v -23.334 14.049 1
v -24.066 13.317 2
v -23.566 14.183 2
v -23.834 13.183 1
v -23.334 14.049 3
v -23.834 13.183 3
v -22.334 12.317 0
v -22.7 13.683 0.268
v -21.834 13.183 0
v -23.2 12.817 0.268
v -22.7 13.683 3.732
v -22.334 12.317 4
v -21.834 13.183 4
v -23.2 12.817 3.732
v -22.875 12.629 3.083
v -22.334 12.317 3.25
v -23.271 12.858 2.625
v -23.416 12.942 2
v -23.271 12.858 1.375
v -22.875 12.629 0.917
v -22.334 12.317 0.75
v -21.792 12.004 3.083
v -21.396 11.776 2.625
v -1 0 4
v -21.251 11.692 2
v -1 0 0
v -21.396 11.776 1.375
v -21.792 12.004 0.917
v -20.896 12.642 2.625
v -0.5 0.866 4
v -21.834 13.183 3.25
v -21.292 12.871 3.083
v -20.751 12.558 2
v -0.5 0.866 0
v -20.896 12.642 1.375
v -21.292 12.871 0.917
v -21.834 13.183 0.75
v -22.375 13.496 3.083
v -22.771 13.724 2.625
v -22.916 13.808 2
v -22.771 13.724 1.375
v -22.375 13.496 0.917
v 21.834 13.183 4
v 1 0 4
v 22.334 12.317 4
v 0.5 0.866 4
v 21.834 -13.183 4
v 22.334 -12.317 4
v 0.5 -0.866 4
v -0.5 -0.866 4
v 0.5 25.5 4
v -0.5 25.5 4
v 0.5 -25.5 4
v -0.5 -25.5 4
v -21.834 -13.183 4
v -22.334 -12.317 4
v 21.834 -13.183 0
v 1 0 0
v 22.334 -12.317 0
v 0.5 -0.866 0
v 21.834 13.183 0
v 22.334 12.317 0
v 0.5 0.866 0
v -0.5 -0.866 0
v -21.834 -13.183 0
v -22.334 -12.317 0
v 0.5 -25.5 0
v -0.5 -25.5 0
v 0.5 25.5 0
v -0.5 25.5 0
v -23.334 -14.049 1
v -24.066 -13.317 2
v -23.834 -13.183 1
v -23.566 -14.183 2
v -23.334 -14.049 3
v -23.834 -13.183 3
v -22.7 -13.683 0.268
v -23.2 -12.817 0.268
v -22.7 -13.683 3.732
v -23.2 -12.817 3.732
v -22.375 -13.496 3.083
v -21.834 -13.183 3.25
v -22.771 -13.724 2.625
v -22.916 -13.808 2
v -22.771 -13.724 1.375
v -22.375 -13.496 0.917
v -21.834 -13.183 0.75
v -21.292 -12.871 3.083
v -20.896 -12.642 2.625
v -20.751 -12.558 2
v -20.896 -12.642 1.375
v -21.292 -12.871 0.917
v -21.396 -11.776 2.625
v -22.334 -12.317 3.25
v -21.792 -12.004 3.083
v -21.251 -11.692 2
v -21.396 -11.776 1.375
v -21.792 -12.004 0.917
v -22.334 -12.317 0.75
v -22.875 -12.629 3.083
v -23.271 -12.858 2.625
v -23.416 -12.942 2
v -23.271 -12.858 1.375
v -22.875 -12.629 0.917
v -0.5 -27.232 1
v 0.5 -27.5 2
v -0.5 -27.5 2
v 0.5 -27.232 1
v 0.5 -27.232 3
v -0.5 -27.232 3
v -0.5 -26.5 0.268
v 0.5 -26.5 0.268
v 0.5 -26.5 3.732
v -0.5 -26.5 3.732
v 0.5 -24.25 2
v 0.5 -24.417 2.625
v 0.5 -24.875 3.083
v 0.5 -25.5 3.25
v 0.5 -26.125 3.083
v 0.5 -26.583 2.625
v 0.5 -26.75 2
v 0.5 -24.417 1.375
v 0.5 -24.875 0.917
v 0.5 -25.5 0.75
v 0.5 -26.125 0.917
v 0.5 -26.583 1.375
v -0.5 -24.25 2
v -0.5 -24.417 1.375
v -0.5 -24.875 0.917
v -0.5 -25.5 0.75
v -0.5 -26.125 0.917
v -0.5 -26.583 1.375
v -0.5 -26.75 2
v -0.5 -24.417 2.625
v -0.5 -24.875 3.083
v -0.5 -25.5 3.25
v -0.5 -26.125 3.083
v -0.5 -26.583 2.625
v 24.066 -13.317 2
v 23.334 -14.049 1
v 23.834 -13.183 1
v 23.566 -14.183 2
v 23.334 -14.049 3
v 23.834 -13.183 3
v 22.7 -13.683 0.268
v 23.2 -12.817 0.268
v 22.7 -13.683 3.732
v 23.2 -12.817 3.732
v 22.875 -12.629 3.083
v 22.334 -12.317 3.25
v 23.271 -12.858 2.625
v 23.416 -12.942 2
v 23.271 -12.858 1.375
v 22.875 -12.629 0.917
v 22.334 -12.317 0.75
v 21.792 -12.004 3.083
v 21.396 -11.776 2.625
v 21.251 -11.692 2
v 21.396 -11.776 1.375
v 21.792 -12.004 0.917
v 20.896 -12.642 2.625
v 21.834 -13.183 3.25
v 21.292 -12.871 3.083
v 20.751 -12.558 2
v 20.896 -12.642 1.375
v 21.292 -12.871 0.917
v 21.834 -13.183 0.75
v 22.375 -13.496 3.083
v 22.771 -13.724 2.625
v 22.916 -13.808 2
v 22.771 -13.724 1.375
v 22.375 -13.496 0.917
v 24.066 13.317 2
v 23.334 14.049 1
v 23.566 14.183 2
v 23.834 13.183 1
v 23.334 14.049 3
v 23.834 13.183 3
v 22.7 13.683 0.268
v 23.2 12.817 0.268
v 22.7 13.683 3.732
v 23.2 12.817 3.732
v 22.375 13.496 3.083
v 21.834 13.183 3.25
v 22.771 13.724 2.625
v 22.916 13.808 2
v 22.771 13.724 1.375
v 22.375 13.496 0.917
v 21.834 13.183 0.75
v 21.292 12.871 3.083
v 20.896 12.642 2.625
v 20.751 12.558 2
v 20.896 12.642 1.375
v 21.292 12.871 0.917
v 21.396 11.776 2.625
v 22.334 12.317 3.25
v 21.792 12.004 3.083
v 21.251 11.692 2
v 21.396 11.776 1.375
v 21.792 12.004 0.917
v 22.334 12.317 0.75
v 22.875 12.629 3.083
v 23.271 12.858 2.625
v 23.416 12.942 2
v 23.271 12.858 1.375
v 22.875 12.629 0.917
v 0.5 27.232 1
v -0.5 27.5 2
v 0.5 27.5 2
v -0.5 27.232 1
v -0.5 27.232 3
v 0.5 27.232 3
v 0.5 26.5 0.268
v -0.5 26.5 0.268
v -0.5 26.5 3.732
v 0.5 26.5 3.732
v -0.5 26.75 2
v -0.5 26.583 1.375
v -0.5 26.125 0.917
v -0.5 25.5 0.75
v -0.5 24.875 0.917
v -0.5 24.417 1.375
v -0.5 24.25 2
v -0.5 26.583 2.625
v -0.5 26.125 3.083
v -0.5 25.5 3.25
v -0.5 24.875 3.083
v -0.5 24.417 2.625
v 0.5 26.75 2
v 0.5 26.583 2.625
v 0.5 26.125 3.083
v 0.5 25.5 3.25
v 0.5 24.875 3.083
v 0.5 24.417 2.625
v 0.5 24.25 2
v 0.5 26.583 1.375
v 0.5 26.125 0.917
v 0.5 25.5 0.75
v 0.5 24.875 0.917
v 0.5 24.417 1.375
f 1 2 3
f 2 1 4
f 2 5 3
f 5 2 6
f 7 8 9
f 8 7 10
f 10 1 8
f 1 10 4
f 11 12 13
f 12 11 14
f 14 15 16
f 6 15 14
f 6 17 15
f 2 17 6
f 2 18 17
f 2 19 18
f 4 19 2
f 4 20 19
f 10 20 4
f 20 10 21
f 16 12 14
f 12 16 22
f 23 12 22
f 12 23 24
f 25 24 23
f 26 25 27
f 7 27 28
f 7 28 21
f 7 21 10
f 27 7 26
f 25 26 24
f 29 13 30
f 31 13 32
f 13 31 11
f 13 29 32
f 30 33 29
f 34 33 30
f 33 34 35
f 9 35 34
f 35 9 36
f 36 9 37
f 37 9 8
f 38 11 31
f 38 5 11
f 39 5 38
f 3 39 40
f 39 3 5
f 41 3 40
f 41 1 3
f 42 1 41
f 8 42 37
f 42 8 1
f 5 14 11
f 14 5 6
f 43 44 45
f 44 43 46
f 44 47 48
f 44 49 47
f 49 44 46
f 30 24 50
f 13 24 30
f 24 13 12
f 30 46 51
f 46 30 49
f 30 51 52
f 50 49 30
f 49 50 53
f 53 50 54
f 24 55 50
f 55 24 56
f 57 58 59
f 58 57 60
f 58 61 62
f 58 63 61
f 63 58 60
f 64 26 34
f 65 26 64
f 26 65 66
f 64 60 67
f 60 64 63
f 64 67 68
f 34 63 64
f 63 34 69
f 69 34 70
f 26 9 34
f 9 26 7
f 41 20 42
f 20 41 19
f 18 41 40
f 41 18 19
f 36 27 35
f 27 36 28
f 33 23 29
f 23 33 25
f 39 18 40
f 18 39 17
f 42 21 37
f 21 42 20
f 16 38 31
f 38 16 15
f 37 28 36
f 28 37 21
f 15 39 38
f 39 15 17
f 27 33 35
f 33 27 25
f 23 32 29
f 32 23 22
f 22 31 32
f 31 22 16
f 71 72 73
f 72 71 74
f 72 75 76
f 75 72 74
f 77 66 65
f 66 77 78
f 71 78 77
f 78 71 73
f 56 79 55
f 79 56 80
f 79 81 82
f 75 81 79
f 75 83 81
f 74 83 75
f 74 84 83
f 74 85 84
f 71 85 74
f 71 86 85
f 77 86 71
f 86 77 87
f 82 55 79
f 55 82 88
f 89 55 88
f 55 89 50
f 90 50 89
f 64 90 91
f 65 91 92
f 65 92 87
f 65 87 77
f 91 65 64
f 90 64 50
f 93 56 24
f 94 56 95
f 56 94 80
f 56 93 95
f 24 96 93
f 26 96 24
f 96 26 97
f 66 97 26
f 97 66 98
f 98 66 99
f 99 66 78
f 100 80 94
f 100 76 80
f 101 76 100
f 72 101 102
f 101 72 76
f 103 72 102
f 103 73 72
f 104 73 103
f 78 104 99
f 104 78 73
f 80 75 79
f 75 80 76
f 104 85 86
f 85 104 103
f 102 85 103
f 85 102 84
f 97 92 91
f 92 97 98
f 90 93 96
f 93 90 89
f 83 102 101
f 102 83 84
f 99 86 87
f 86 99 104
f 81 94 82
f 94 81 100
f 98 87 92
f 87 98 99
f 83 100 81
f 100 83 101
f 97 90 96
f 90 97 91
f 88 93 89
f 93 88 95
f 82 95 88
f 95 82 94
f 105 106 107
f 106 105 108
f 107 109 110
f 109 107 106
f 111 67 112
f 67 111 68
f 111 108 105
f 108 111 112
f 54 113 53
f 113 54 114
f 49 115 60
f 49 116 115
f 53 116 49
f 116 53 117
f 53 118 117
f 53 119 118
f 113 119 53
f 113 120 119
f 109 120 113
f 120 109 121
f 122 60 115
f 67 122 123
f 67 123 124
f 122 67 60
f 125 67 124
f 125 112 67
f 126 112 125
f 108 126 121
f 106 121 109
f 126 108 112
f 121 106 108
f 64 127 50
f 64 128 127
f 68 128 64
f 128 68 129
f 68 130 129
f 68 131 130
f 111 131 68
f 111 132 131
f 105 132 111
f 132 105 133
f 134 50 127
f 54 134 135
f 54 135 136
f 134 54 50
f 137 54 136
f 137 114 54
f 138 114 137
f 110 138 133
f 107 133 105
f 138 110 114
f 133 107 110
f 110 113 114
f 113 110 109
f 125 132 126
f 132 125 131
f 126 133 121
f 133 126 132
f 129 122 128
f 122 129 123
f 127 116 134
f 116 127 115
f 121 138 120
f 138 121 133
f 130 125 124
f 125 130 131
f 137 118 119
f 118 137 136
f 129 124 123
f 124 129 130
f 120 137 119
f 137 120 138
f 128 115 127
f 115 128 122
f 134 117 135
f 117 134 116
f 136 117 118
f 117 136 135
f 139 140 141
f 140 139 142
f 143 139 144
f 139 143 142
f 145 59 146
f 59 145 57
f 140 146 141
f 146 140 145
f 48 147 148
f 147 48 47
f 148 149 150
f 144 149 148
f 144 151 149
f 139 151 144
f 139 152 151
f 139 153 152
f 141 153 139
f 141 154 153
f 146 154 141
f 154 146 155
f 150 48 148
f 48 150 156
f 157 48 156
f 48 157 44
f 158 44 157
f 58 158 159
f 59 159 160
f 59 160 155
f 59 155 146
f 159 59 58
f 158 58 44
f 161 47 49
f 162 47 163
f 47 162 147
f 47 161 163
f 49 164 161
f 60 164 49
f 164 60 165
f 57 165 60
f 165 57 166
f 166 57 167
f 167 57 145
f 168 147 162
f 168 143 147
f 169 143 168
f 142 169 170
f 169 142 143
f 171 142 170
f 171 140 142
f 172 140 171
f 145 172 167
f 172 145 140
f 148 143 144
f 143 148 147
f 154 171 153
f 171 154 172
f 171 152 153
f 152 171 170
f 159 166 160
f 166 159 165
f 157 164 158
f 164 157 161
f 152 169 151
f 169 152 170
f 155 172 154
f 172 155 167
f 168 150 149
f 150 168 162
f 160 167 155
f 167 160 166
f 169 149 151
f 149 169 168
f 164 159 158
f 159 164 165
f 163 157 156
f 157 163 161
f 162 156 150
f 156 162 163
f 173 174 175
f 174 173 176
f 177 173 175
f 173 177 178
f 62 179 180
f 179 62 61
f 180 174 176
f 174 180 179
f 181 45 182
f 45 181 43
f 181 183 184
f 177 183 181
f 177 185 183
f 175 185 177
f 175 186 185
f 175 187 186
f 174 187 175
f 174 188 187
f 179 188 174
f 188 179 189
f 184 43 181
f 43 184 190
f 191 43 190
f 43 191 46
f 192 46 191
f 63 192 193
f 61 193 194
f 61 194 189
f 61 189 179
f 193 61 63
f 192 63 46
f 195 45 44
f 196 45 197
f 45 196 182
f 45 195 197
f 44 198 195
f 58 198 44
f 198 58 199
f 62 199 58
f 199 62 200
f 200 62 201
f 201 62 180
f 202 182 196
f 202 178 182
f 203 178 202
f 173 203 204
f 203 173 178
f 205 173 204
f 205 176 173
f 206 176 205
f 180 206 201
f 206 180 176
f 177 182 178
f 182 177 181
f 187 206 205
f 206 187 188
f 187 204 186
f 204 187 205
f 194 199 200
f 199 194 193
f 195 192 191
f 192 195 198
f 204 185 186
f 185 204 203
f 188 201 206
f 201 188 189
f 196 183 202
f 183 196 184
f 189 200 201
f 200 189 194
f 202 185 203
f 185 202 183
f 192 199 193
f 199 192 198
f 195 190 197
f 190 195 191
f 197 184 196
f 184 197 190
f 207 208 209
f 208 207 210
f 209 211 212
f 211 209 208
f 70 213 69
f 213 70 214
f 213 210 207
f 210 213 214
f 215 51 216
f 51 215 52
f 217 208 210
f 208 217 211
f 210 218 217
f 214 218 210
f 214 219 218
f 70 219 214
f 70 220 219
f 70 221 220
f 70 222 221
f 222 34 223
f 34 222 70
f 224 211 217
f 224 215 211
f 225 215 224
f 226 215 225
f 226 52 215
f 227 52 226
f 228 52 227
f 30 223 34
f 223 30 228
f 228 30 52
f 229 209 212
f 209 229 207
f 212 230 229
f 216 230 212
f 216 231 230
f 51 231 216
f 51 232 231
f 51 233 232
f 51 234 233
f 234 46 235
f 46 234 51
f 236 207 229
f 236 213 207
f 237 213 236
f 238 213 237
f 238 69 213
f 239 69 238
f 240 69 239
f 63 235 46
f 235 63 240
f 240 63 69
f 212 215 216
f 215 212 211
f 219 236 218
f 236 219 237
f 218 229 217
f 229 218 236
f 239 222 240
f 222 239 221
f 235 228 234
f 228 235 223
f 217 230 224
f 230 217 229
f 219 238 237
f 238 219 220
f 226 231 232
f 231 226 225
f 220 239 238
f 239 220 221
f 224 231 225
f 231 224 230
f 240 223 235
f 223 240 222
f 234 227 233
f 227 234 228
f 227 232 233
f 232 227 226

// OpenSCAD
seed = .5;
size = 55;

module mirror_keep(angle = [ 1, 0, 0 ])
{
    children();
    mirror(angle) children();
}

module rotate_keep(angle)
{
    children();
    rotate(angle) children();
}

angles = [ 45, 90, -45 ];

module snowflake_arm(seed, angle, size)
{
    height = 4;
    mirror_keep() union()
    {
        difference()
        {
            union()
            {
                translate([ 0, size - height / 2, height / 2 ]) rotate([ 0, 90, 0 ], $fn = 12)
                    cylinder(height / 4, r = height / 2, center = true);
                cube([ height / 8, size - height / 2, height ]);
            }
            translate([ 0, size - height / 2, height / 2 ]) rotate([ 0, 90, 0 ], $fn = 12)
                cylinder(height / 4 + .1, r = height / 3.2, center = true);
        }
        linear_extrude(height) difference()
        {
            union()
            {
                r = rands(0, 1, 10000, seed = seed);
                for (i = [0:round(rands(1, 6, 1, seed = seed)[0])])
                {
                    anglei = round((len(angles) - 1) * (r[10 * i + 3]));
                    translate([ 0, round(size * .7 * r[10 * i + 1]) - .5 ]) rotate(angles[anglei])
                        square([ (r[10 * i + 5] + 1.) * .6, size ], center = true);
                }
            }
            rotate(-angle - .1) square([ 100, 100 ]);
            mirror([ 1, 0, 0 ]) square([ 100, 100 ]);
            translate([ 0, size, 0 ]) square([ 100, 100 ]);
        }
    }
}

module rotate_copy(count)
{
    for (i = [1:count])
    {
        rotate((360 / count) * i)
        {
            children();
        }
    }
}

module snowflake(seed, size = 50)
{

    n = [ 6, 8 ][round(rands(0, 1, 1, seed)[0])];
    echo(n);
    rotate_copy(n)
    {
        snowflake_arm(seed, (360 / (n * 2)), size / 2);
    }
}

snowflake(seed, size);
